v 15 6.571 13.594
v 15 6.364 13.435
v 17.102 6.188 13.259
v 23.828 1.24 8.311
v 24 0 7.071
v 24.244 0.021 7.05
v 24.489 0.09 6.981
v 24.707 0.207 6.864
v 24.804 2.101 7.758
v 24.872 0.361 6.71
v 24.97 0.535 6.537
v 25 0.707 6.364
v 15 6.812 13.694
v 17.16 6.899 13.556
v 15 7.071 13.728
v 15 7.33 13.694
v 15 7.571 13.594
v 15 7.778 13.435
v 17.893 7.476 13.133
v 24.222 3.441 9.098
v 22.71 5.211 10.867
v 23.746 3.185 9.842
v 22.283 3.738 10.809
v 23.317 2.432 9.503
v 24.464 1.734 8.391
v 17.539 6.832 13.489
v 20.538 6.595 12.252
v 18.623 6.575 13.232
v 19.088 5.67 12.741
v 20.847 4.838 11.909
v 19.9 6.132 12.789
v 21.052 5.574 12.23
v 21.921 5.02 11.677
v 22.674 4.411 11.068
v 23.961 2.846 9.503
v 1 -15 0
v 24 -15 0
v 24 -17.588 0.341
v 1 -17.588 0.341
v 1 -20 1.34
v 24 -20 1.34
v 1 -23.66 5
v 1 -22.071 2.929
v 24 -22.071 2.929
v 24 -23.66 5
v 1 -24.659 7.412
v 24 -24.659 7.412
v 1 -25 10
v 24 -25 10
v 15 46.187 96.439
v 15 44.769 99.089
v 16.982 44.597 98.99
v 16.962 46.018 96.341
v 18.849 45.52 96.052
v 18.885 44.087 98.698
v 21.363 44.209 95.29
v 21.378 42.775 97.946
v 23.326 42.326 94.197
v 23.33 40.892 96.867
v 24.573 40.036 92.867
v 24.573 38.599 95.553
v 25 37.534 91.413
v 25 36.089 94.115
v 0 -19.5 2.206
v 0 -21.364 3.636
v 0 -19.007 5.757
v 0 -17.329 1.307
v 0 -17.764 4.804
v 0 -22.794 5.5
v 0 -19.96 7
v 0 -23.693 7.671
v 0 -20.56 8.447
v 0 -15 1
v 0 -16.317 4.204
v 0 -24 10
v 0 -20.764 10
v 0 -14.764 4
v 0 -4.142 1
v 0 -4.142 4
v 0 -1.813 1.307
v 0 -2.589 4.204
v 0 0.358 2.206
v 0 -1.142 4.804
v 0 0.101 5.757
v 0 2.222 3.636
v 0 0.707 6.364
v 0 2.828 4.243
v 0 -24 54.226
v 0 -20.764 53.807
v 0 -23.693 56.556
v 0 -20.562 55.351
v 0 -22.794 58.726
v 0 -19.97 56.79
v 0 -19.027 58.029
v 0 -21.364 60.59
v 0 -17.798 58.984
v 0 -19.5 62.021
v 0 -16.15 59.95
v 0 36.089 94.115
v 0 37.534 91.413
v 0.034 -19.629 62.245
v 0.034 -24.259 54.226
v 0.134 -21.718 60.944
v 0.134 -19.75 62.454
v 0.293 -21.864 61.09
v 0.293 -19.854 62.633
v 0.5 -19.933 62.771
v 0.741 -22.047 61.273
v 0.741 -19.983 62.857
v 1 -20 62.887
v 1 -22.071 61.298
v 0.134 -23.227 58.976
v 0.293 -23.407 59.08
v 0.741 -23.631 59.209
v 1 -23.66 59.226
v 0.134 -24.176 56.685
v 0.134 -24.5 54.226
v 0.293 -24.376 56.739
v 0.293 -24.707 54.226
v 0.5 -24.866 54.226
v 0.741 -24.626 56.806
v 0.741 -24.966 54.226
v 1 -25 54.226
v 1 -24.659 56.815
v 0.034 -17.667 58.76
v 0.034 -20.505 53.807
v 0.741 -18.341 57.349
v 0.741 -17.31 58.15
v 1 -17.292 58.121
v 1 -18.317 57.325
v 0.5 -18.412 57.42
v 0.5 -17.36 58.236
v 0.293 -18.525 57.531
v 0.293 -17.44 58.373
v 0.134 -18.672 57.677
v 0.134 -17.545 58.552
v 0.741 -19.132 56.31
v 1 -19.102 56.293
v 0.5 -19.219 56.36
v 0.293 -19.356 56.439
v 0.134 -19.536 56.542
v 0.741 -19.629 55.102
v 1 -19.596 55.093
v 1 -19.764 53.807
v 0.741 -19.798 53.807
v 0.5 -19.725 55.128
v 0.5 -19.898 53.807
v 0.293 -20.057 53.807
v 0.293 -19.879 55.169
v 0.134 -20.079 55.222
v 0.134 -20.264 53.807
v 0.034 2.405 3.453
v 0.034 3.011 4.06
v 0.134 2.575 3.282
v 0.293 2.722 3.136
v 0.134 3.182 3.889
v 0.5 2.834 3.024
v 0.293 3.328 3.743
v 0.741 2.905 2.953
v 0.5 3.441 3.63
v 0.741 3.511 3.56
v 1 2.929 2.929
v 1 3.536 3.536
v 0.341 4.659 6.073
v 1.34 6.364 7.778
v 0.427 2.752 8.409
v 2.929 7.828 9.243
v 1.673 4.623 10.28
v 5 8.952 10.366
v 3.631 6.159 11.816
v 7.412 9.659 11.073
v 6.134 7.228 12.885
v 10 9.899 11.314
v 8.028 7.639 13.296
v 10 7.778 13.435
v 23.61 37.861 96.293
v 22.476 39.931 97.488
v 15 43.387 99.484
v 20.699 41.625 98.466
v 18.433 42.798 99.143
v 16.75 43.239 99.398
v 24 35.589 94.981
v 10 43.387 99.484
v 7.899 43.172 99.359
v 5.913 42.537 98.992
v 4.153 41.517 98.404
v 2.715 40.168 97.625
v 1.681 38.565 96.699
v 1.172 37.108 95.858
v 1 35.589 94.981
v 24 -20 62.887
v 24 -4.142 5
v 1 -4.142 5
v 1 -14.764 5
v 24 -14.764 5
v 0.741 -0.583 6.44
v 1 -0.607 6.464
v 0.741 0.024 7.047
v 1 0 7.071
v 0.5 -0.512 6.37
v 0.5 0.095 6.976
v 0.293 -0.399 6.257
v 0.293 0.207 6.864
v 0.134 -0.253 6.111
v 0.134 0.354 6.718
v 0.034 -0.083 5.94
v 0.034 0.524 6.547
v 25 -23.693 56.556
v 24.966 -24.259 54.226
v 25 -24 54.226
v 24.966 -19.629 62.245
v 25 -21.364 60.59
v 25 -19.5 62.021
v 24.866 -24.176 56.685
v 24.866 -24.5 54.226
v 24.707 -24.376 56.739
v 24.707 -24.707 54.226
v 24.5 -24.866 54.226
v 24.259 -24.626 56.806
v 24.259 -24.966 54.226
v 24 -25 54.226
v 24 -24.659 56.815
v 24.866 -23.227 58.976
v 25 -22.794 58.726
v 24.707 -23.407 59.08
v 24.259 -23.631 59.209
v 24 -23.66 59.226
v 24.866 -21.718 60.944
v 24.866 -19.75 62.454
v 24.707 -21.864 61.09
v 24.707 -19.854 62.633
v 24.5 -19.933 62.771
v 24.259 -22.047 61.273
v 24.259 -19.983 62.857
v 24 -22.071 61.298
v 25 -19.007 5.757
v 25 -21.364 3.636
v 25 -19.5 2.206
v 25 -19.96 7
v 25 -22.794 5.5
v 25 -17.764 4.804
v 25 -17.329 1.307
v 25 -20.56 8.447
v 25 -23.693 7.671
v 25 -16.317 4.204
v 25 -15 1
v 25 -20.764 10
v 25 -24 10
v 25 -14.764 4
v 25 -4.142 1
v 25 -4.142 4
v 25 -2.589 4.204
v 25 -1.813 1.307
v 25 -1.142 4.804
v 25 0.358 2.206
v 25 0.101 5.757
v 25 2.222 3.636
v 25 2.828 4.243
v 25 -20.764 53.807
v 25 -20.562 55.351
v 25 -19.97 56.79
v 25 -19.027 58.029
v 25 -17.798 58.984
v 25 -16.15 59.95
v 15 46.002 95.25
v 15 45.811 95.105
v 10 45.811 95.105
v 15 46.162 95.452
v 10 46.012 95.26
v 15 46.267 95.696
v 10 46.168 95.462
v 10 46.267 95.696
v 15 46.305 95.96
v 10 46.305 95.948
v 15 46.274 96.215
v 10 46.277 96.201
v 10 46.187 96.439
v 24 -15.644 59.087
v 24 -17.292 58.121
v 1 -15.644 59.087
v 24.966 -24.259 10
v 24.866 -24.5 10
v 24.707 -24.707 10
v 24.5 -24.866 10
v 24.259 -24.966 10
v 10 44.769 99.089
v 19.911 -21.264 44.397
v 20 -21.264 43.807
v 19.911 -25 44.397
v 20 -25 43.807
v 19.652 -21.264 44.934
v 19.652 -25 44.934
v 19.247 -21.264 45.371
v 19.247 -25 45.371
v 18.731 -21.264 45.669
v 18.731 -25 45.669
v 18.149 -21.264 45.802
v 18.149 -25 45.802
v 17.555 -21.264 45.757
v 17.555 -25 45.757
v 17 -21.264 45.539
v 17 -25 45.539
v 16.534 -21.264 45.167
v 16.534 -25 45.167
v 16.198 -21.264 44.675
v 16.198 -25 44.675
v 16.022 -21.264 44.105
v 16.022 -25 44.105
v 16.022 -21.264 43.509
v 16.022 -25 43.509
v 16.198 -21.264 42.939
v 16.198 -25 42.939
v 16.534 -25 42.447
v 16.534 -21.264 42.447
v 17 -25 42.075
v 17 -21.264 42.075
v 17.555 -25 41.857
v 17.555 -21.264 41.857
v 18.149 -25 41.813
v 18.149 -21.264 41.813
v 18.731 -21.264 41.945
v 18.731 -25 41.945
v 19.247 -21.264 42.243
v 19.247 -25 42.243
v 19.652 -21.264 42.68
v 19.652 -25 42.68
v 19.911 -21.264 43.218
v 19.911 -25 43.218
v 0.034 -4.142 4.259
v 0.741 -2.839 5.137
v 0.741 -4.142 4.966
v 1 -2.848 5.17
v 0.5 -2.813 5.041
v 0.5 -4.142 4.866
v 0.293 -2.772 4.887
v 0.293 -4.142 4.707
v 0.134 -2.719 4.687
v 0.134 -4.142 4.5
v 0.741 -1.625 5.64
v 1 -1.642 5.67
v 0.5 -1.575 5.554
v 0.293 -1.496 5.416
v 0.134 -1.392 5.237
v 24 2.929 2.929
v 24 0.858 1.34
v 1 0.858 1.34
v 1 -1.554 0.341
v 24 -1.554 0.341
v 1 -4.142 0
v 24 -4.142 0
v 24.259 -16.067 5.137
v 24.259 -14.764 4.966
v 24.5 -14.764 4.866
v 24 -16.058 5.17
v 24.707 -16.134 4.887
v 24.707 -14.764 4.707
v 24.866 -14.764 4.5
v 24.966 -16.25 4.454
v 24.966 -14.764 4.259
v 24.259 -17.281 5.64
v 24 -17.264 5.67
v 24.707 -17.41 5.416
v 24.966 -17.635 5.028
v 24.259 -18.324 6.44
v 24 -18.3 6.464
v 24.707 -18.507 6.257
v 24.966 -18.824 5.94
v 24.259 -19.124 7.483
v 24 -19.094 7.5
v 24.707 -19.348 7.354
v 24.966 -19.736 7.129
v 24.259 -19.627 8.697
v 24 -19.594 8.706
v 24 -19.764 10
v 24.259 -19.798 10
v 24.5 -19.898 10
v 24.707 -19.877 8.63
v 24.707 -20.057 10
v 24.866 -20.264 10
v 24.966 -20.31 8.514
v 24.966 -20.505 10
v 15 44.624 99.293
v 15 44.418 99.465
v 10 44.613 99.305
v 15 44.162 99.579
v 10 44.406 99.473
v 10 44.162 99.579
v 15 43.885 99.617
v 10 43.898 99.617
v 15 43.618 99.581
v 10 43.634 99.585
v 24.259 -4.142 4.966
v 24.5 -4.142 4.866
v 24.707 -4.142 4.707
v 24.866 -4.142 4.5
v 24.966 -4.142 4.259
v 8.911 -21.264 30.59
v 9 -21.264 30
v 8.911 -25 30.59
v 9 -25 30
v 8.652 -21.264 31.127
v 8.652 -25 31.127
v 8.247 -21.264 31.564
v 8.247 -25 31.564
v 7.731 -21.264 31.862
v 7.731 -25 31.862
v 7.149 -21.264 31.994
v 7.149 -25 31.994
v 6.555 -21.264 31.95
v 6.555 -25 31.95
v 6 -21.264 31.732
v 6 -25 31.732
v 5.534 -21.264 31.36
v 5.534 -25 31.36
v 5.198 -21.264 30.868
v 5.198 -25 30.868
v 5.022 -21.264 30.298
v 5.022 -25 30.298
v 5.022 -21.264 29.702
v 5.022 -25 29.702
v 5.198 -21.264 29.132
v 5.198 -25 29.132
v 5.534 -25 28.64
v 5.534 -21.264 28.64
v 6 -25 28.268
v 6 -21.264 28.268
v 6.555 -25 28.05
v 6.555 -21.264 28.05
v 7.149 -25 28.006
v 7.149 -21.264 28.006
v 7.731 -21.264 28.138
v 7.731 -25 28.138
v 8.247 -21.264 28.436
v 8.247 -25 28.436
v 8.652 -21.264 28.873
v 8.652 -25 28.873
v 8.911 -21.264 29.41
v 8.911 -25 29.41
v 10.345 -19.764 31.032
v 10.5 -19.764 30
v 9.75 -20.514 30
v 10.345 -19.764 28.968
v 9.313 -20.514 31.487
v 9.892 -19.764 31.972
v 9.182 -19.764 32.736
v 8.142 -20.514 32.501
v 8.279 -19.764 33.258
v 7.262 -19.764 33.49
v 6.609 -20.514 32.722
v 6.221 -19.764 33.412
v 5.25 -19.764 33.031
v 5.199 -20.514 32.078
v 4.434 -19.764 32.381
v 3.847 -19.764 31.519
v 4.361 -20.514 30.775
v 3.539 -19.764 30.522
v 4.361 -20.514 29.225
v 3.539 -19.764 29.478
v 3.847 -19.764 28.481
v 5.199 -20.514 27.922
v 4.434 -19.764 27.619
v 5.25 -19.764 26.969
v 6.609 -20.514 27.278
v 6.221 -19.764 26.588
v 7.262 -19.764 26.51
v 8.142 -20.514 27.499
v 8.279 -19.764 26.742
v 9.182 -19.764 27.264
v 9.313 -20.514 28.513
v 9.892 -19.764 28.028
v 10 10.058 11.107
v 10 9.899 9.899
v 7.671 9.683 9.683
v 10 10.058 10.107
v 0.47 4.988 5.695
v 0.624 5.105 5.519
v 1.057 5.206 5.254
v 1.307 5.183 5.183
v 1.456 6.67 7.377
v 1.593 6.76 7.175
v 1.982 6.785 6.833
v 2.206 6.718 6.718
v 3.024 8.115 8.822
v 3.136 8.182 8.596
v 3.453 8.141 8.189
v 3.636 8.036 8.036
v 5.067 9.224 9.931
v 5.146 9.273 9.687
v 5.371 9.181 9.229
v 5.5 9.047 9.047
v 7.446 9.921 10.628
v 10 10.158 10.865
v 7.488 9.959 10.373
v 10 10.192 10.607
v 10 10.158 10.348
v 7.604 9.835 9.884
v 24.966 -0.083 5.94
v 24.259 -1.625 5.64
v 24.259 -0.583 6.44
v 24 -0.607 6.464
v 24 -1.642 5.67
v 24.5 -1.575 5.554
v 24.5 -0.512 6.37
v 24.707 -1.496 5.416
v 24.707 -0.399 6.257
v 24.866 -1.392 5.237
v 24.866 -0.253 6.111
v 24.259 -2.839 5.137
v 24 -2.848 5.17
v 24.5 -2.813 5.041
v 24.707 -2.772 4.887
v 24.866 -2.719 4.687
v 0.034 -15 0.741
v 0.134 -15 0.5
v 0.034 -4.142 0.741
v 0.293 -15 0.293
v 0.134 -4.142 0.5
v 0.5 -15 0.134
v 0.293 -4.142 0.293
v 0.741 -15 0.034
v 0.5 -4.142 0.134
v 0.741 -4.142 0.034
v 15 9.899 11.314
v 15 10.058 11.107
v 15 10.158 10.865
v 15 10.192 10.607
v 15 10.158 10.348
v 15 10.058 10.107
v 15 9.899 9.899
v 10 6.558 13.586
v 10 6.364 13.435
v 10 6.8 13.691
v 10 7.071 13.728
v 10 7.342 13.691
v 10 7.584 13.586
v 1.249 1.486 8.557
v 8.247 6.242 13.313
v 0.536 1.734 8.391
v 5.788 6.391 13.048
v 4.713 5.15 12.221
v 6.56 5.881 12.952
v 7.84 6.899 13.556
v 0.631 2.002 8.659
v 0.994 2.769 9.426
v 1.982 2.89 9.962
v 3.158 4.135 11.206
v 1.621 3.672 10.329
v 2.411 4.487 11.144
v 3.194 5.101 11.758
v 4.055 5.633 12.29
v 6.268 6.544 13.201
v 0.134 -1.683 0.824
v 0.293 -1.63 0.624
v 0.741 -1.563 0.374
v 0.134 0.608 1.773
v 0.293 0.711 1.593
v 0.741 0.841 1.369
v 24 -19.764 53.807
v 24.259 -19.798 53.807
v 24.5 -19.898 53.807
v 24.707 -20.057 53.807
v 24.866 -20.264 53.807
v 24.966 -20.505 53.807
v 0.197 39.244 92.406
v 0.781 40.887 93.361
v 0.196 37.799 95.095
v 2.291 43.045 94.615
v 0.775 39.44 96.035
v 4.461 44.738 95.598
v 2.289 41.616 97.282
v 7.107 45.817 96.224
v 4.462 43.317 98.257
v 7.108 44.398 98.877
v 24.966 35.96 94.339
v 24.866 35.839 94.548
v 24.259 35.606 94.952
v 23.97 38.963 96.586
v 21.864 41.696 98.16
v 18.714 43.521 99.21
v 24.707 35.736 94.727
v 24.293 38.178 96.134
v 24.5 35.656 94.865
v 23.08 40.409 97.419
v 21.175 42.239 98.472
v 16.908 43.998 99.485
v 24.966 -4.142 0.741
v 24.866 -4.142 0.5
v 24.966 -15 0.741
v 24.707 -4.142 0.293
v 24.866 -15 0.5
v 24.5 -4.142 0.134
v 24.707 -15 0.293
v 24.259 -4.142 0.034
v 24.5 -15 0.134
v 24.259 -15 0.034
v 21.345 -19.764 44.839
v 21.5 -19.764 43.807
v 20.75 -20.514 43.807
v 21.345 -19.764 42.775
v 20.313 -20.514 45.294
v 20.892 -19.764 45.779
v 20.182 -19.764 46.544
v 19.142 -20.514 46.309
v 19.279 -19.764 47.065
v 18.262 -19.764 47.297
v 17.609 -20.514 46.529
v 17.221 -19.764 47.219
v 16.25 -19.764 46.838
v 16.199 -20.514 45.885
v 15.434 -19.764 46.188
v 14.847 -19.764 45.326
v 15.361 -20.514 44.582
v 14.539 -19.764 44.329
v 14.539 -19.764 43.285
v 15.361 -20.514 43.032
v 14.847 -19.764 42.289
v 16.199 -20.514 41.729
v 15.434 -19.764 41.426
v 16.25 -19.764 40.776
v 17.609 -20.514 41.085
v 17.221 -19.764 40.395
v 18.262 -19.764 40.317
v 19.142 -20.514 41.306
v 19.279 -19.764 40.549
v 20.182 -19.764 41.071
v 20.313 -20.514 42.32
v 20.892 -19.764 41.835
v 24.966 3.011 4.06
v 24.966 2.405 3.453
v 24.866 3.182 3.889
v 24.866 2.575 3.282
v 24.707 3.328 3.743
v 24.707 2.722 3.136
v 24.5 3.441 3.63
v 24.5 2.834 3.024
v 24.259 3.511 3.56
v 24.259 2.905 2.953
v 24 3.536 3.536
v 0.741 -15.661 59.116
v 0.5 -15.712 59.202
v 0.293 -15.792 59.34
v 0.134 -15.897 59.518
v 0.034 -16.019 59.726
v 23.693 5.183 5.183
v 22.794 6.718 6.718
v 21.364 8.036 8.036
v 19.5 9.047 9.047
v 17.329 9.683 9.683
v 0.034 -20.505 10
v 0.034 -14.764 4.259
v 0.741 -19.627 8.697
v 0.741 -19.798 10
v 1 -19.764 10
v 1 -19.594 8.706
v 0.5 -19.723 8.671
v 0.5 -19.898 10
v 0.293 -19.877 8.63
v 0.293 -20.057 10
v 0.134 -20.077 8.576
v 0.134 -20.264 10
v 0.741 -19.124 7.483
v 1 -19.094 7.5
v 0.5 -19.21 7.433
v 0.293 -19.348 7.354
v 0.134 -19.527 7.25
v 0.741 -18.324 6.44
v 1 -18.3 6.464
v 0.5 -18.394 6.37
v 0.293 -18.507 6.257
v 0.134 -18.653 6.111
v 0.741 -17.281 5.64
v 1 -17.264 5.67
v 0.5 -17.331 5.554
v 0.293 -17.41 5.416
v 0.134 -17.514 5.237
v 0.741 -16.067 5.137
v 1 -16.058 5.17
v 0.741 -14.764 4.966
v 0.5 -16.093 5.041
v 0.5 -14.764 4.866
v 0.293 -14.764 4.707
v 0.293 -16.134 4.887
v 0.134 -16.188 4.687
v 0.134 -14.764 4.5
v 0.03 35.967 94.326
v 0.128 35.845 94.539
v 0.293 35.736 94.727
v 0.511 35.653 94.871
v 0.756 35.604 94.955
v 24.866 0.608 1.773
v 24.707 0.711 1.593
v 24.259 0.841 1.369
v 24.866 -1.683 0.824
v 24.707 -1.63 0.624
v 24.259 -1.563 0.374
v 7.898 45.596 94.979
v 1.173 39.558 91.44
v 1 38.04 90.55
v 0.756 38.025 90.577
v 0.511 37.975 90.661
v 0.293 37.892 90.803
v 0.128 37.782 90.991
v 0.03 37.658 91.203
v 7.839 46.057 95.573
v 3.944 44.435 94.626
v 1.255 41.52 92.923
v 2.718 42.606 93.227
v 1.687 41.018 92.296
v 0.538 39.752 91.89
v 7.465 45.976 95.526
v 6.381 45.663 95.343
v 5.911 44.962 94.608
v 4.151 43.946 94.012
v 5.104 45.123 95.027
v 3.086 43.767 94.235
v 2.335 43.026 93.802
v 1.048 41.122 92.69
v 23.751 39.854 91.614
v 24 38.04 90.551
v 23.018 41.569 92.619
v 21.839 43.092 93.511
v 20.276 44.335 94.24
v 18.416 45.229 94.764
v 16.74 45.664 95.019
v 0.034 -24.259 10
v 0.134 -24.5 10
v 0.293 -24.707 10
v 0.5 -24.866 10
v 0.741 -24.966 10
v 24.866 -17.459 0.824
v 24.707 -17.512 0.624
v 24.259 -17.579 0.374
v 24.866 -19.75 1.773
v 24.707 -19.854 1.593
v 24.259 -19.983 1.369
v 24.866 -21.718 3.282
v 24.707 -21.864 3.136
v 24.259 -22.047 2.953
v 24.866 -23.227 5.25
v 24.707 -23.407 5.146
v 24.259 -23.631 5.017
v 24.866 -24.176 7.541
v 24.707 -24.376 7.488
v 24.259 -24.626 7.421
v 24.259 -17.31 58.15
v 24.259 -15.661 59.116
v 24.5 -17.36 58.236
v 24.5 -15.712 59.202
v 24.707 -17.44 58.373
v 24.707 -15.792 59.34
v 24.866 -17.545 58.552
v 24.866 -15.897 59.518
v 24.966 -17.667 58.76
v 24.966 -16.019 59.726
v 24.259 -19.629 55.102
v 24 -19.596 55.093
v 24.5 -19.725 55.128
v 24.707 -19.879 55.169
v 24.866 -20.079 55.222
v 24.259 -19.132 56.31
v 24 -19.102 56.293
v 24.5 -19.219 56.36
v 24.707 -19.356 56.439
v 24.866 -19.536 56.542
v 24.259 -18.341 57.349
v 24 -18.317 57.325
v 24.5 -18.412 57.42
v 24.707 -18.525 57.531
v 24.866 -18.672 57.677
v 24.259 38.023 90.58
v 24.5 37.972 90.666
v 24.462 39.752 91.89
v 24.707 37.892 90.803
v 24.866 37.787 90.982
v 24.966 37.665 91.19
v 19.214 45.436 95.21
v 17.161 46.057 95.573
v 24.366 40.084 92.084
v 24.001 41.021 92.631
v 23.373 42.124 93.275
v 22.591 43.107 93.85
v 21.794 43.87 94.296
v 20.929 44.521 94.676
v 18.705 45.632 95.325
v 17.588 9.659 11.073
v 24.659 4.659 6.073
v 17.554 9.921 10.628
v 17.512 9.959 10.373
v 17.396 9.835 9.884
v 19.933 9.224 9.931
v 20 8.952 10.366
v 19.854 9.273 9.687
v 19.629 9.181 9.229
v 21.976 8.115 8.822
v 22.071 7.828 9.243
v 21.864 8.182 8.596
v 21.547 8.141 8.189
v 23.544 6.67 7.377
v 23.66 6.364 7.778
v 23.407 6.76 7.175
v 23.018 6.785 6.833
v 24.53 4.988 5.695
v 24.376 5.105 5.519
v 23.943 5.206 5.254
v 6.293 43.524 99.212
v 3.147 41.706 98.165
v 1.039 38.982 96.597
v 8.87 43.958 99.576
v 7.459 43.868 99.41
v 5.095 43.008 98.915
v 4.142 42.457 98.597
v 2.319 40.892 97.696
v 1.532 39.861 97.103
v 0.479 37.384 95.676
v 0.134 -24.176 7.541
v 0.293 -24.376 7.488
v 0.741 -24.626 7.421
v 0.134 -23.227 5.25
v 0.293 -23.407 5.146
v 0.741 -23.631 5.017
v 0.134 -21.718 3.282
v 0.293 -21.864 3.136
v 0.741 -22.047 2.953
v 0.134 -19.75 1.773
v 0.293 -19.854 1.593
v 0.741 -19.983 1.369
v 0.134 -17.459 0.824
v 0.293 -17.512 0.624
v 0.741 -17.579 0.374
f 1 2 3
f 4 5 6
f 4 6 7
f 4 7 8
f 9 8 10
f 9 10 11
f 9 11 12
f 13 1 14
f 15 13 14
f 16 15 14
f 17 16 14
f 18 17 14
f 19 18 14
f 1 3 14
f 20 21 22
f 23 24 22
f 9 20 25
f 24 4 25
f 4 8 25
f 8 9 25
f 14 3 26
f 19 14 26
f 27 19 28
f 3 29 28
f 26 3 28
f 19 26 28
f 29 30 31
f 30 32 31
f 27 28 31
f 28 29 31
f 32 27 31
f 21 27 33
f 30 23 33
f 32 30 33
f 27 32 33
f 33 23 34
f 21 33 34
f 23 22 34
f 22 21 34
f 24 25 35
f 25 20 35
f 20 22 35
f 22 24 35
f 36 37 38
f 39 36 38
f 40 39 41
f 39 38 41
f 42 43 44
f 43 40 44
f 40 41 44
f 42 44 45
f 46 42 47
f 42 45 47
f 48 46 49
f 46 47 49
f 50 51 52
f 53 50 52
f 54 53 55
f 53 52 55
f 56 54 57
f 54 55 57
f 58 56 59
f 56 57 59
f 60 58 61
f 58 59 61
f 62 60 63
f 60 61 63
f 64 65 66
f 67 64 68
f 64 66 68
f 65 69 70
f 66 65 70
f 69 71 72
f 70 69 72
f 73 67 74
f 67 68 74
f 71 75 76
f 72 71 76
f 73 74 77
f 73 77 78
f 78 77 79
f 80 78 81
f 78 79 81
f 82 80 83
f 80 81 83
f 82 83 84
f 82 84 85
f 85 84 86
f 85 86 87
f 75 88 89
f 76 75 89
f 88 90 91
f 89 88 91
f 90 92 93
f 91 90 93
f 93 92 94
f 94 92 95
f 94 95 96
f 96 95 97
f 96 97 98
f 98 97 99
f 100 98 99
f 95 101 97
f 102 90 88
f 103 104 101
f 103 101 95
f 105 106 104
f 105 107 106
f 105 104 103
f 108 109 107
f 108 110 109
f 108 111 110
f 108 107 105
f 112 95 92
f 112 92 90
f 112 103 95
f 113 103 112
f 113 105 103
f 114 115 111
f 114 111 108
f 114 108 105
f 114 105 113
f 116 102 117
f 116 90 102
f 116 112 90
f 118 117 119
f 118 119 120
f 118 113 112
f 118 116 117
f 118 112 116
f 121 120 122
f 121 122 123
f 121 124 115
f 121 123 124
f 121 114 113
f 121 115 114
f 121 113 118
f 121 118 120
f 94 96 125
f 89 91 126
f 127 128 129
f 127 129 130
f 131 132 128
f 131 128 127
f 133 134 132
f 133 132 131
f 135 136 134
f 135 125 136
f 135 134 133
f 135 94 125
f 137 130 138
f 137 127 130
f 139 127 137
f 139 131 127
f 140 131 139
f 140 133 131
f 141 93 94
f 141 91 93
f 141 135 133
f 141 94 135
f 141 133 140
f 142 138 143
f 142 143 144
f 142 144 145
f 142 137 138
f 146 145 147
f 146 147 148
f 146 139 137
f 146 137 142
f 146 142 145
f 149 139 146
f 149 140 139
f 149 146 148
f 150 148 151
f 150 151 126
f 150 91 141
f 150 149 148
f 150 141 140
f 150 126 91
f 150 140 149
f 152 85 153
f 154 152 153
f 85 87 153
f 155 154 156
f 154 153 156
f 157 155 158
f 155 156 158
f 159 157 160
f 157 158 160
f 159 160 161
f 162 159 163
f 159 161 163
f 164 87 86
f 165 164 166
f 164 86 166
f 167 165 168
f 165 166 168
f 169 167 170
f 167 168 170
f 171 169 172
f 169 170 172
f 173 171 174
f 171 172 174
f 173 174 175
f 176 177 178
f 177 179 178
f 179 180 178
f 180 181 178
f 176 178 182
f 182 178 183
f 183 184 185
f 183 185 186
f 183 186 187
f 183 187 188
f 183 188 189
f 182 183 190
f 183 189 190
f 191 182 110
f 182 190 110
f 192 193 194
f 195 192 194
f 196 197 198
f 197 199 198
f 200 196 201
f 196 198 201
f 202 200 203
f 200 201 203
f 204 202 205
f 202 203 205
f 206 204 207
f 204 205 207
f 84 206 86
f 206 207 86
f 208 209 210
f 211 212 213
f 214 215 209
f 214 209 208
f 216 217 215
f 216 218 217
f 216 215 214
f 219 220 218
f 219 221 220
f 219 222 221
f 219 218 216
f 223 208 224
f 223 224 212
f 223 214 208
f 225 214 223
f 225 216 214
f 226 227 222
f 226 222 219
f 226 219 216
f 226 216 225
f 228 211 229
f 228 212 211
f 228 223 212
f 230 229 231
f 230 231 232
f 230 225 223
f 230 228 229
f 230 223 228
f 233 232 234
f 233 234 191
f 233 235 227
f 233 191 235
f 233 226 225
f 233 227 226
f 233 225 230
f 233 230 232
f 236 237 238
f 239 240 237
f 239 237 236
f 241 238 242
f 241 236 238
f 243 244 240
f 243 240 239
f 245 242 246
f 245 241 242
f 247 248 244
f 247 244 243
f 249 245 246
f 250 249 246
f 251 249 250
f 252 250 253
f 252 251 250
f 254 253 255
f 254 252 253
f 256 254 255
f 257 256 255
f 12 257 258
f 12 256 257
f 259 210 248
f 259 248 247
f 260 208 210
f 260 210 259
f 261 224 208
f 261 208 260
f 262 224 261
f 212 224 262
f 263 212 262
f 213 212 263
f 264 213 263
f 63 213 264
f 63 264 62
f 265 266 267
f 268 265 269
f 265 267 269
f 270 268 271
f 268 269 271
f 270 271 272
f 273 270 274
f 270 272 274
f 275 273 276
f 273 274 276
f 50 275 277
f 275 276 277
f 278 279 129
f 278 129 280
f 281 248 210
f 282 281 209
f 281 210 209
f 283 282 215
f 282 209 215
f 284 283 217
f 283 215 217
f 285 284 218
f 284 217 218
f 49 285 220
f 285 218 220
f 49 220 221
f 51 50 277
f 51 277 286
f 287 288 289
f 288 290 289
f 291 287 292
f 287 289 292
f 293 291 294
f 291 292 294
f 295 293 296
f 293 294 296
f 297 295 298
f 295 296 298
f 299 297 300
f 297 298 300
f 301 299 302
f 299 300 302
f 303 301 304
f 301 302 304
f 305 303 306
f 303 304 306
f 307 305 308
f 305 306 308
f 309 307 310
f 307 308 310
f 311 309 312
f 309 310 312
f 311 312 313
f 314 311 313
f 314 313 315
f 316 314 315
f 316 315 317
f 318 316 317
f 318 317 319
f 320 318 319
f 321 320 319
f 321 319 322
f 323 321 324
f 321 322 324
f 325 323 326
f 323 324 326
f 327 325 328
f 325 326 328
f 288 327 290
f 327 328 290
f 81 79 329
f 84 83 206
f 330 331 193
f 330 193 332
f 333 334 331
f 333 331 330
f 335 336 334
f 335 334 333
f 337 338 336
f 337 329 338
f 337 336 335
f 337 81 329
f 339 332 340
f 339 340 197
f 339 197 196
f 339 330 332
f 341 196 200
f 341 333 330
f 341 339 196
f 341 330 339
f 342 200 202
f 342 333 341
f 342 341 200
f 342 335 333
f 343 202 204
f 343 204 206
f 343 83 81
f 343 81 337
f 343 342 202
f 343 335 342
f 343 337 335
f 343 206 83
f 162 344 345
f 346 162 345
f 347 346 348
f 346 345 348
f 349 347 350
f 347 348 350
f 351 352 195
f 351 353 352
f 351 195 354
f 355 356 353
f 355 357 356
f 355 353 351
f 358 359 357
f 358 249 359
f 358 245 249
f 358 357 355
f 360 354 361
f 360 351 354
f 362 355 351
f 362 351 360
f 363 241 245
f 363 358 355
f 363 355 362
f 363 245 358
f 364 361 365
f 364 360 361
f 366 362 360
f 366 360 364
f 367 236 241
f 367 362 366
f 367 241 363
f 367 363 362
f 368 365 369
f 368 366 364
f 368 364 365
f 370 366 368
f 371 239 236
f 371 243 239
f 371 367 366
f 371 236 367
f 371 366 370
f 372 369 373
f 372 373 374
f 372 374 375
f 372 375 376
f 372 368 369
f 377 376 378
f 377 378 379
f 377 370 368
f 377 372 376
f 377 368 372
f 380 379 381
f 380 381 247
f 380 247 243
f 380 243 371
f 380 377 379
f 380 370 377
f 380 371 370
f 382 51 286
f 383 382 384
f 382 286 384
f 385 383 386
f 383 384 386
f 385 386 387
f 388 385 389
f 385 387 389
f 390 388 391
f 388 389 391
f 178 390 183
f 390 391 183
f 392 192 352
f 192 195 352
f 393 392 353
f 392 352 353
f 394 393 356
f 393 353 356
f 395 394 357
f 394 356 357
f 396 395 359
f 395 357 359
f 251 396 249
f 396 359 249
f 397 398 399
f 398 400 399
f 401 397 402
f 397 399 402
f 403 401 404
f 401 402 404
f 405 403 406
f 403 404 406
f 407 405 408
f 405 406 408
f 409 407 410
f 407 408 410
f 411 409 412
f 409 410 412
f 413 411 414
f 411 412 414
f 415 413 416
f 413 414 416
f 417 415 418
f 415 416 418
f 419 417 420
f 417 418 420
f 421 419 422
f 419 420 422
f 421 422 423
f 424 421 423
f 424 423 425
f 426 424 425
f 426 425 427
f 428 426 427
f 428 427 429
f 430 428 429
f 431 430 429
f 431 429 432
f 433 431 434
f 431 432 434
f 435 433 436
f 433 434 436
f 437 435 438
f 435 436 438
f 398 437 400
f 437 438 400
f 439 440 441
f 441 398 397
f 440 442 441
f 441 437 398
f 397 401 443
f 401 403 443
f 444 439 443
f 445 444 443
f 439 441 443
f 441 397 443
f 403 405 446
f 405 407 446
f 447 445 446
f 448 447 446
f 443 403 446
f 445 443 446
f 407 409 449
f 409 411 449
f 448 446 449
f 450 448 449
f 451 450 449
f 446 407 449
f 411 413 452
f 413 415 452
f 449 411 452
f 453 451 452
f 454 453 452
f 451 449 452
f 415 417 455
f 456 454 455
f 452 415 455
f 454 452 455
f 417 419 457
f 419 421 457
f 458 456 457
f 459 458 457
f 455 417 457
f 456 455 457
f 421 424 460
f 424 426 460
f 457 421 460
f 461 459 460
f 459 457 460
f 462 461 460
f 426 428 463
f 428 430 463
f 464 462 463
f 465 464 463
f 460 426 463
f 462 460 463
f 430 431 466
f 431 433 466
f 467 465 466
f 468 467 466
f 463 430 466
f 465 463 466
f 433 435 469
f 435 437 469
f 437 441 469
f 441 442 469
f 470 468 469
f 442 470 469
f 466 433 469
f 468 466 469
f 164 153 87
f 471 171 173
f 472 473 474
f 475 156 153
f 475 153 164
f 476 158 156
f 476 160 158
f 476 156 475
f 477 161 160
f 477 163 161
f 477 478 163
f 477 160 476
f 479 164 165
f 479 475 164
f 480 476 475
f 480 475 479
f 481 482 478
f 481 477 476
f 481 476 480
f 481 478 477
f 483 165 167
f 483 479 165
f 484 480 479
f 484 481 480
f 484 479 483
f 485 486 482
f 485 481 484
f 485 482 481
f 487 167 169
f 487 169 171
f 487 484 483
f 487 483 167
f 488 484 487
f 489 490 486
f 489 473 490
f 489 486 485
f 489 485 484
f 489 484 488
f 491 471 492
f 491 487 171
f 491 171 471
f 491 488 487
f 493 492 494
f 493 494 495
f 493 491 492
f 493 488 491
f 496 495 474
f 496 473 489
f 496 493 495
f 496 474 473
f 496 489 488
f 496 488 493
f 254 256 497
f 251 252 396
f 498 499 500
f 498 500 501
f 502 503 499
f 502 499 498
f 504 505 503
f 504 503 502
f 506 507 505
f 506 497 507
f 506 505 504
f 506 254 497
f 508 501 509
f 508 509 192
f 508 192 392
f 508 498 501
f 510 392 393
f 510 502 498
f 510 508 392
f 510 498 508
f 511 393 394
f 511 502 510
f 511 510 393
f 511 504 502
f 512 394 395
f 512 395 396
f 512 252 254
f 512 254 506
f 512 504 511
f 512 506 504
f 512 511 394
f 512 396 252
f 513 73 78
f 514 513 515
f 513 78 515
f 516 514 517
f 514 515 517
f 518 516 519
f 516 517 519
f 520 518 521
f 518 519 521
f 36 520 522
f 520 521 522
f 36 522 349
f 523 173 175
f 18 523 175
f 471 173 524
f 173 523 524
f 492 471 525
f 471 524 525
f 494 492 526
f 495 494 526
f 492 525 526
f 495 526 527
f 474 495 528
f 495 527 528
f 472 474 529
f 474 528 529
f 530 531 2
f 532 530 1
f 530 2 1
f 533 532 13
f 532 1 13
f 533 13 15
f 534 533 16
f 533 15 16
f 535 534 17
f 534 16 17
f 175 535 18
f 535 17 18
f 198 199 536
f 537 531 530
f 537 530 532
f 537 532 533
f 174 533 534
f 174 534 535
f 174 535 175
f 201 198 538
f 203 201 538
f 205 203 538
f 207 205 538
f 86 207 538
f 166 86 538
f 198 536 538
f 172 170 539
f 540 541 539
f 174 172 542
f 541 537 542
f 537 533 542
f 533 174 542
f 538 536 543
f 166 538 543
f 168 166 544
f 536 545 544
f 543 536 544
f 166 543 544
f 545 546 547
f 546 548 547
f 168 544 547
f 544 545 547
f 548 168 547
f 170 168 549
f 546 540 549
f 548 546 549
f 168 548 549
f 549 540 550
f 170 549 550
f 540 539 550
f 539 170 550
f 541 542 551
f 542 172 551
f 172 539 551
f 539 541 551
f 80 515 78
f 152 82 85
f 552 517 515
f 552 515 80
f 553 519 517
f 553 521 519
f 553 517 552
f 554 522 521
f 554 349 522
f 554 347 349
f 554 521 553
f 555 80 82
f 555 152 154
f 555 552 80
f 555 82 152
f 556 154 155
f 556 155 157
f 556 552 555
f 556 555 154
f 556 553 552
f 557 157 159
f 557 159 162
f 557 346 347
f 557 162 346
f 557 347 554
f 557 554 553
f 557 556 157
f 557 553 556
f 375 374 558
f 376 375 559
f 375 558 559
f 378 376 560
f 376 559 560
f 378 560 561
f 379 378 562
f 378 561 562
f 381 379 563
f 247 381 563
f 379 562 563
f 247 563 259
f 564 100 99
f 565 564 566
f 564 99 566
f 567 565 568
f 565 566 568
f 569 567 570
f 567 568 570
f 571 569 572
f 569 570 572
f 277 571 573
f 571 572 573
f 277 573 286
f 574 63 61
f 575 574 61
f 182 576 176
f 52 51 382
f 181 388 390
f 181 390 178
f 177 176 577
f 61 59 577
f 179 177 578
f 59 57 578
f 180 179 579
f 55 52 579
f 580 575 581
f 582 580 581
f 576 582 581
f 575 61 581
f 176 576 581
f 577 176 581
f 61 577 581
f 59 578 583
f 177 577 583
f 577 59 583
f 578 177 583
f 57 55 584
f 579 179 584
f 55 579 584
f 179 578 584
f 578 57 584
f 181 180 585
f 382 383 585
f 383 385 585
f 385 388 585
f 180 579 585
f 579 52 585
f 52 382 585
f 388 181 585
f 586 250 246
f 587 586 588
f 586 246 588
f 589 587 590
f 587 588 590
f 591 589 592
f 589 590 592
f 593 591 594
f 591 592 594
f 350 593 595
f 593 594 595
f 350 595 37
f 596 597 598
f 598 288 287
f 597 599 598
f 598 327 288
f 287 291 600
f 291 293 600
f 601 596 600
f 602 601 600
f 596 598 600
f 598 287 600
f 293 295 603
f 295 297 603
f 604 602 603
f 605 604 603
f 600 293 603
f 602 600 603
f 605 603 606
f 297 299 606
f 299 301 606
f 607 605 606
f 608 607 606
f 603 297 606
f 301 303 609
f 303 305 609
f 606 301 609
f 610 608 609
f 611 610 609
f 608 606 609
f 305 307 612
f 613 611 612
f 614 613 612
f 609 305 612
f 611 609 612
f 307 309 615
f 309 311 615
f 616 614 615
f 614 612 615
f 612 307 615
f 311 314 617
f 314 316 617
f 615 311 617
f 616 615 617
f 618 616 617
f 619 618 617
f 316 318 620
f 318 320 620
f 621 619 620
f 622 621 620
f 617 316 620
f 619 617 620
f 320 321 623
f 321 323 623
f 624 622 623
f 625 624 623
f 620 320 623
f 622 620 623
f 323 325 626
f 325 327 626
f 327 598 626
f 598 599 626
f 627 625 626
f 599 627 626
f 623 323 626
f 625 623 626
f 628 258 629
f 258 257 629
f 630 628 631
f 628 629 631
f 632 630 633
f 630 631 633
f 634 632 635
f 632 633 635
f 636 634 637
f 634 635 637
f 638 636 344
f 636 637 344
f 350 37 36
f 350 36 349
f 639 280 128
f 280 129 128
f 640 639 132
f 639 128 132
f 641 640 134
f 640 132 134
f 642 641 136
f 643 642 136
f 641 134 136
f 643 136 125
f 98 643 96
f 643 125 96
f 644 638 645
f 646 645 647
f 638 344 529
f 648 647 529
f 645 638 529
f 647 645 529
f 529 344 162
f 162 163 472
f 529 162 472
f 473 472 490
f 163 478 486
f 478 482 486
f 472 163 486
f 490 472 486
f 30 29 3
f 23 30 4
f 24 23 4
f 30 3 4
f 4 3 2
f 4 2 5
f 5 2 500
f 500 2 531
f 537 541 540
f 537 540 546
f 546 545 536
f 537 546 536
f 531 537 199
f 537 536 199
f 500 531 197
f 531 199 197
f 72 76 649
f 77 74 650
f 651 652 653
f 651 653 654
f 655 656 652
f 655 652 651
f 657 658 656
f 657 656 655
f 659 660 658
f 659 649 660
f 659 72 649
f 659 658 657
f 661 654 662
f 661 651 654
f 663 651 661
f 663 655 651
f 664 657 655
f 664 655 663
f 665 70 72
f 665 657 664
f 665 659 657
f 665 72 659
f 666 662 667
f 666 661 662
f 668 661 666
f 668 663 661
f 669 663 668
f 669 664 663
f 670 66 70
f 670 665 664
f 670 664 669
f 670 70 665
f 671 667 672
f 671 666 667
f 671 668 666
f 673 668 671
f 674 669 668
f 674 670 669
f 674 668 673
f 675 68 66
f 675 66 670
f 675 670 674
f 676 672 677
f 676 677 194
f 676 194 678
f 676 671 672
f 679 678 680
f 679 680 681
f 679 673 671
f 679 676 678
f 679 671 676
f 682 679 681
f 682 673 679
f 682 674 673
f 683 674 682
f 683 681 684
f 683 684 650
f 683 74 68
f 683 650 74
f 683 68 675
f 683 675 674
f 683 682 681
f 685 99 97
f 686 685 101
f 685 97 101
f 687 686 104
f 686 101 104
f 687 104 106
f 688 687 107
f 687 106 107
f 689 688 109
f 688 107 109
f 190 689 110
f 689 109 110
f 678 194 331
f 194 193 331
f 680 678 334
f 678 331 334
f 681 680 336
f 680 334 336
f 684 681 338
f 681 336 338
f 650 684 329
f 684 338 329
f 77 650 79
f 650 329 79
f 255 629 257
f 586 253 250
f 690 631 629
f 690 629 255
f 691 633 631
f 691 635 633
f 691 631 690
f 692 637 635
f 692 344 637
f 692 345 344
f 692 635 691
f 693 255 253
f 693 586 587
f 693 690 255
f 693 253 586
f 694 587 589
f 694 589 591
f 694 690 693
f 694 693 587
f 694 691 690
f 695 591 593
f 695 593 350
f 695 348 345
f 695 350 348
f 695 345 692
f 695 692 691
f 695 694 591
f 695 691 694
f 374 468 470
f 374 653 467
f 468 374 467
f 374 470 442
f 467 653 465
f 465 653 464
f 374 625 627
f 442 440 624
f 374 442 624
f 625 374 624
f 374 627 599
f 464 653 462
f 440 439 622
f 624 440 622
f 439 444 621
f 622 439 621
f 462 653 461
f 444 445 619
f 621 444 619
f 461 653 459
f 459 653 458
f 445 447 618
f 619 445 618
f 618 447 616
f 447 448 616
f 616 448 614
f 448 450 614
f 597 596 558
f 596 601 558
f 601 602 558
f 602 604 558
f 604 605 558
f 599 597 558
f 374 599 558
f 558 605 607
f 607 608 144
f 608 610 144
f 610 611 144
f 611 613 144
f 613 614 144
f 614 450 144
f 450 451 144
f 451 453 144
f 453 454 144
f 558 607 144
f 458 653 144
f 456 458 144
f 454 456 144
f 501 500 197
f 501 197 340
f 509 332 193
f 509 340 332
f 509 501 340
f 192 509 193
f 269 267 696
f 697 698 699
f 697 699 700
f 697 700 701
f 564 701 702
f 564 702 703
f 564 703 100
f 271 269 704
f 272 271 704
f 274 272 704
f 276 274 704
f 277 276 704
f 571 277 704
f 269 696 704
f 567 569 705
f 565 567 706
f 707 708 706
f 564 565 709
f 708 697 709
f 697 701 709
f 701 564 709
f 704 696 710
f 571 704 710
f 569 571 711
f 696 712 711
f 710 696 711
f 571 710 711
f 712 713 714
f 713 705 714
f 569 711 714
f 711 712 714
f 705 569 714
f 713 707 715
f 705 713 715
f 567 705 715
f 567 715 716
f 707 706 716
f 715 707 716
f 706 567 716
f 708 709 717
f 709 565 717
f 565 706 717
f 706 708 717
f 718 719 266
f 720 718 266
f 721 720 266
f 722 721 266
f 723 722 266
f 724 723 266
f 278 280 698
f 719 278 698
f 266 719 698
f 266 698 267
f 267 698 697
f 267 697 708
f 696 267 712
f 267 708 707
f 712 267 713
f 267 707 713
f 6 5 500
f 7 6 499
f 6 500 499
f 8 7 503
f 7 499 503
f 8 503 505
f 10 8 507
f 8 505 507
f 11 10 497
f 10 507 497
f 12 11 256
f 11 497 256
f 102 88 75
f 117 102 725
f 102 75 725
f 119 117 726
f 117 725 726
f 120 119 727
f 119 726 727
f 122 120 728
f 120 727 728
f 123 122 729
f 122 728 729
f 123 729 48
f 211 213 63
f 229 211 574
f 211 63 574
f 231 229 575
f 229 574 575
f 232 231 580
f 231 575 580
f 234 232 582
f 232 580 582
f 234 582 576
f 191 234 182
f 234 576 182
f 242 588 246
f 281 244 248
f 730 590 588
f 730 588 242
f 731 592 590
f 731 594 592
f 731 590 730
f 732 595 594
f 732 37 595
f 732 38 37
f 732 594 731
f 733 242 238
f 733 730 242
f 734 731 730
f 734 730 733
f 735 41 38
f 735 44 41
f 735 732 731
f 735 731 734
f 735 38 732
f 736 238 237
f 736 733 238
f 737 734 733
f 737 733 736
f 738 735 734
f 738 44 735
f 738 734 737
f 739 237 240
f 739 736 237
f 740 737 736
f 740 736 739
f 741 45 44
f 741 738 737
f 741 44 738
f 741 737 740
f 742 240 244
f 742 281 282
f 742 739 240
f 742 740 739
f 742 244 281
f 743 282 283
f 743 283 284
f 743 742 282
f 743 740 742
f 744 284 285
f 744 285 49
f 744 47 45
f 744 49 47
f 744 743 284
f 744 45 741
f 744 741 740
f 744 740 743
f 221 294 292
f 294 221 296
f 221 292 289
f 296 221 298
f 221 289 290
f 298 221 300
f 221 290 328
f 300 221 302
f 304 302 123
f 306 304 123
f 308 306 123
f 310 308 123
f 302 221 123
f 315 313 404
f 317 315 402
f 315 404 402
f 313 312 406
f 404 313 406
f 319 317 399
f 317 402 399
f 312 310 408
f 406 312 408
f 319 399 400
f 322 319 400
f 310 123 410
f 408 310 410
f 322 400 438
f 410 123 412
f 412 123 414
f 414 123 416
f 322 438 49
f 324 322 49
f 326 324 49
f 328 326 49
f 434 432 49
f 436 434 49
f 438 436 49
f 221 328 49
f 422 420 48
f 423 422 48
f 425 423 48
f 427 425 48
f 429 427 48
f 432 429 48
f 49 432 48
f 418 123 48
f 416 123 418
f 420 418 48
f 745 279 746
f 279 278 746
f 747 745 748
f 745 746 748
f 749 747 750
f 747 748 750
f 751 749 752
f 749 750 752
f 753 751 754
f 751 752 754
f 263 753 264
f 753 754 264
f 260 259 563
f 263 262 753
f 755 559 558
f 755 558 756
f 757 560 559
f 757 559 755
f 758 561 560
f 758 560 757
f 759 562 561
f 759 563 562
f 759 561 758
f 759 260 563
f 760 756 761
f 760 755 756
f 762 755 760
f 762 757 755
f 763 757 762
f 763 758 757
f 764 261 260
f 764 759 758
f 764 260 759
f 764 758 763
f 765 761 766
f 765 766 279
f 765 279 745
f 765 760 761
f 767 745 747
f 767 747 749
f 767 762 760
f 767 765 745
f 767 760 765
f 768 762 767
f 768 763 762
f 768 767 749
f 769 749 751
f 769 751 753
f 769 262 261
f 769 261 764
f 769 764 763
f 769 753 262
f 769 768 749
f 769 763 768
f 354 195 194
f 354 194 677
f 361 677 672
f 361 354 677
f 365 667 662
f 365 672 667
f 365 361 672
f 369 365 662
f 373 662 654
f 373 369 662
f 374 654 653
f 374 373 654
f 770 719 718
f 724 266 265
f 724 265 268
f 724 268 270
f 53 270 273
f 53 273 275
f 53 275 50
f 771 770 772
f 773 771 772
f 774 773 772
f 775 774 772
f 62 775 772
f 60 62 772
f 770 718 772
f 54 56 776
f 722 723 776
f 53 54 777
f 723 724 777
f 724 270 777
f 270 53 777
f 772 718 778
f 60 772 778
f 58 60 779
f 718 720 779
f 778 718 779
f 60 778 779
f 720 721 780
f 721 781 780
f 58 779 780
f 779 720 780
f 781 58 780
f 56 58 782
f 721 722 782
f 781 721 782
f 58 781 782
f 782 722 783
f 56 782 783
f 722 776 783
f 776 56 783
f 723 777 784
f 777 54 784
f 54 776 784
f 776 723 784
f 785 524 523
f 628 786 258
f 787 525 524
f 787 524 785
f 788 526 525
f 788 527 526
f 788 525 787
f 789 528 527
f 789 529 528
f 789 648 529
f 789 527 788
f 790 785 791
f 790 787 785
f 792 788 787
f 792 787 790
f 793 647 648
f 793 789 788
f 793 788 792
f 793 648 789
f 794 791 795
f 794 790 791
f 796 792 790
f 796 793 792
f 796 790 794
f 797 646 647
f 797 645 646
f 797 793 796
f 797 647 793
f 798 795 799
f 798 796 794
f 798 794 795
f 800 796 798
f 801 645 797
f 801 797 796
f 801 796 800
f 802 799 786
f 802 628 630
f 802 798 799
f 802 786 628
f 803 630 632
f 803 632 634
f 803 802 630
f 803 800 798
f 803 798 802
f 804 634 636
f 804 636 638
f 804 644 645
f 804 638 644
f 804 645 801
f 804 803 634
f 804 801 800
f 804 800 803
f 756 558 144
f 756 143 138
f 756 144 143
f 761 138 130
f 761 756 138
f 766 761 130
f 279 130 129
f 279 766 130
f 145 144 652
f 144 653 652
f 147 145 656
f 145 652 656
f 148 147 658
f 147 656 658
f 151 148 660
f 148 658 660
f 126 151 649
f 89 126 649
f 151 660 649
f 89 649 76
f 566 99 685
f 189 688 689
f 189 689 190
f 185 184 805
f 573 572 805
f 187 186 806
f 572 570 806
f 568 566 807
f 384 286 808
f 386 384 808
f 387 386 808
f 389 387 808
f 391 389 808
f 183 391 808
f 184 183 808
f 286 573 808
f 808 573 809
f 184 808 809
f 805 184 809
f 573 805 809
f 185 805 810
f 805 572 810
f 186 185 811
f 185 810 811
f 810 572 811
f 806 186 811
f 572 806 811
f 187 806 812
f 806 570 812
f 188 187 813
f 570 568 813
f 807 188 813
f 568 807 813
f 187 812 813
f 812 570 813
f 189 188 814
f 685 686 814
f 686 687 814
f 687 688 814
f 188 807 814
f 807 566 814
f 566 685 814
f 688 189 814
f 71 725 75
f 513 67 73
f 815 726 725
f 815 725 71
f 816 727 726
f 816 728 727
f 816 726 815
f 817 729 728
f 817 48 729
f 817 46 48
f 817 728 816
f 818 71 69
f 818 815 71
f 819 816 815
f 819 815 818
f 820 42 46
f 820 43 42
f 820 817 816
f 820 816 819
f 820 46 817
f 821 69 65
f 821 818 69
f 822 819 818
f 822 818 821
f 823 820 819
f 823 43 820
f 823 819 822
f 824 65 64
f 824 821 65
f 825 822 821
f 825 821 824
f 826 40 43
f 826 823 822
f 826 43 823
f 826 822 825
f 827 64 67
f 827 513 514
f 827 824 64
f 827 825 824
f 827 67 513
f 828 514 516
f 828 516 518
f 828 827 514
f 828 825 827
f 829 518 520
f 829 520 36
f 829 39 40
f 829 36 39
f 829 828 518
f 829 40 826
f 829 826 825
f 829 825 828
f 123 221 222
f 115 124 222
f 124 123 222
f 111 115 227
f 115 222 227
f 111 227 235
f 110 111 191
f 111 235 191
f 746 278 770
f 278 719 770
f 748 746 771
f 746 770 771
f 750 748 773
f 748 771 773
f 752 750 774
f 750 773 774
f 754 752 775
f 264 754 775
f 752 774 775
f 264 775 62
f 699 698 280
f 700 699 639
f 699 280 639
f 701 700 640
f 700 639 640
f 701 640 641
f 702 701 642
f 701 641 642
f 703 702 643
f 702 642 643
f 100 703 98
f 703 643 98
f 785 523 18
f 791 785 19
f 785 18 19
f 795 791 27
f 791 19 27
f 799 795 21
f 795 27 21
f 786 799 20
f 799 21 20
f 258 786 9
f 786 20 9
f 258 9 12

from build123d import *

# Parameters (mm, degrees)
F1_DEPTH       = 25
F2_R           = 5
F3_R           = 10
F4_R           = 10
F5_R           = 10
F6_R           = 1
F8_D           = 4
F8_CSINK_D     = 7
F8_CSINK_ANGLE = 90
F9_R           = 1


with BuildPart() as f1:
    # F0 (on Right) → F1 (new body)
    with BuildSketch(Plane.YZ):
        Polygon((-25, 0), (0, 0), (10.6066017178, 10.6066017178), (7.0710678119, 14.1421356237), (-2.0710678119, 5), (-19.7640469252, 5), (-19.7640469252, 6.6023203544), (-19.7640469252, 56.6721200803), (-15.6440361776, 59.0868194482), (46.6402980765, 95.5910792091), (44.2820323028, 100), (-25, 60), align=None)
    extrude(amount=F1_DEPTH)

    # F2
    f2_edges = [f1.edges().sort_by_distance(p)[0] for p in [
        (12.5, -19.764047, 56.67212),
        (12.5, -19.764047, 5),
        (12.5, -2.071068, 5),
    ]]
    fillet(f2_edges, radius=F2_R)

    # F3
    f3_edges = [f1.edges().sort_by_distance(p)[0] for p in [
        (12.5, -25, 60),
        (12.5, -25, 0),
        (12.5, 0, 0),
    ]]
    fillet(f3_edges, radius=F3_R)

    # F4
    f4_edges = [f1.edges().sort_by_distance(p)[0] for p in [
        (25, 8.838835, 12.374369),
        (0, 8.838835, 12.374369),
    ]]
    fillet(f4_edges, radius=F4_R)

    # F5
    f5_edges = [f1.edges().sort_by_distance(p)[0] for p in [
        (25, 45.461165, 97.79554),
        (0, 45.461165, 97.79554),
    ]]
    fillet(f5_edges, radius=F5_R)

    # F6
    f6_edges = [f1.edges().sort_by_distance(p)[0] for p in [
        (25, -19.764047, 31.903548),
        (25, 10.357028, 74.325798),
        (25, -19.102314, 56.292944),
        (22.07241, 44.110307, 94.108276),
        (12.5, 46.640298, 95.591079),
        (2.92759, 44.110307, 94.108276),
        (0, 10.357028, 74.325798),
        (0, -19.102314, 56.292944),
        (0, -19.764047, 31.903548),
    ]]
    fillet(f6_edges, radius=F6_R)

    # F8 (through all)
    with Locations(Plane(origin=(0, -19.7640469252, 0), x_dir=(-1, 0, 0), z_dir=(0, 1, 0))):
        with Locations((-18, 43.8070958611), (-7, 30)):
            CounterSinkHole(F8_D / 2, F8_CSINK_D / 2, counter_sink_angle=F8_CSINK_ANGLE)

    # F9
    f9_edges = [f1.edges().sort_by_distance(p)[0] for p in [
        (22.071068, 8.535534, 8.535534),
        (12.5, 10.606602, 10.606602),
        (2.928932, 8.535534, 8.535534),
        (0, -0.315301, 0.761205),
        (0, 3.232233, 3.232233),
        (0, -9.571068, 0),
        (25, -0.315301, 0.761205),
        (25, 3.232233, 3.232233),
        (25, -9.571068, 0),
        (25, -22.071068, 2.928932),
        (0, -22.071068, 2.928932),
        (25, -25, 32.113249),
        (0, -25, 32.113249),
        (25, -23.660254, 59.226497),
        (25, 7.808611, 78.94206),
        (0, -23.660254, 59.226497),
        (0, 7.808611, 78.94206),
        (22.071998, 41.743362, 98.534298),
        (2.928002, 41.743362, 98.534298),
        (12.5, 44.282032, 100),
    ]]
    fillet(f9_edges, radius=F9_R)


solid = f1.part
